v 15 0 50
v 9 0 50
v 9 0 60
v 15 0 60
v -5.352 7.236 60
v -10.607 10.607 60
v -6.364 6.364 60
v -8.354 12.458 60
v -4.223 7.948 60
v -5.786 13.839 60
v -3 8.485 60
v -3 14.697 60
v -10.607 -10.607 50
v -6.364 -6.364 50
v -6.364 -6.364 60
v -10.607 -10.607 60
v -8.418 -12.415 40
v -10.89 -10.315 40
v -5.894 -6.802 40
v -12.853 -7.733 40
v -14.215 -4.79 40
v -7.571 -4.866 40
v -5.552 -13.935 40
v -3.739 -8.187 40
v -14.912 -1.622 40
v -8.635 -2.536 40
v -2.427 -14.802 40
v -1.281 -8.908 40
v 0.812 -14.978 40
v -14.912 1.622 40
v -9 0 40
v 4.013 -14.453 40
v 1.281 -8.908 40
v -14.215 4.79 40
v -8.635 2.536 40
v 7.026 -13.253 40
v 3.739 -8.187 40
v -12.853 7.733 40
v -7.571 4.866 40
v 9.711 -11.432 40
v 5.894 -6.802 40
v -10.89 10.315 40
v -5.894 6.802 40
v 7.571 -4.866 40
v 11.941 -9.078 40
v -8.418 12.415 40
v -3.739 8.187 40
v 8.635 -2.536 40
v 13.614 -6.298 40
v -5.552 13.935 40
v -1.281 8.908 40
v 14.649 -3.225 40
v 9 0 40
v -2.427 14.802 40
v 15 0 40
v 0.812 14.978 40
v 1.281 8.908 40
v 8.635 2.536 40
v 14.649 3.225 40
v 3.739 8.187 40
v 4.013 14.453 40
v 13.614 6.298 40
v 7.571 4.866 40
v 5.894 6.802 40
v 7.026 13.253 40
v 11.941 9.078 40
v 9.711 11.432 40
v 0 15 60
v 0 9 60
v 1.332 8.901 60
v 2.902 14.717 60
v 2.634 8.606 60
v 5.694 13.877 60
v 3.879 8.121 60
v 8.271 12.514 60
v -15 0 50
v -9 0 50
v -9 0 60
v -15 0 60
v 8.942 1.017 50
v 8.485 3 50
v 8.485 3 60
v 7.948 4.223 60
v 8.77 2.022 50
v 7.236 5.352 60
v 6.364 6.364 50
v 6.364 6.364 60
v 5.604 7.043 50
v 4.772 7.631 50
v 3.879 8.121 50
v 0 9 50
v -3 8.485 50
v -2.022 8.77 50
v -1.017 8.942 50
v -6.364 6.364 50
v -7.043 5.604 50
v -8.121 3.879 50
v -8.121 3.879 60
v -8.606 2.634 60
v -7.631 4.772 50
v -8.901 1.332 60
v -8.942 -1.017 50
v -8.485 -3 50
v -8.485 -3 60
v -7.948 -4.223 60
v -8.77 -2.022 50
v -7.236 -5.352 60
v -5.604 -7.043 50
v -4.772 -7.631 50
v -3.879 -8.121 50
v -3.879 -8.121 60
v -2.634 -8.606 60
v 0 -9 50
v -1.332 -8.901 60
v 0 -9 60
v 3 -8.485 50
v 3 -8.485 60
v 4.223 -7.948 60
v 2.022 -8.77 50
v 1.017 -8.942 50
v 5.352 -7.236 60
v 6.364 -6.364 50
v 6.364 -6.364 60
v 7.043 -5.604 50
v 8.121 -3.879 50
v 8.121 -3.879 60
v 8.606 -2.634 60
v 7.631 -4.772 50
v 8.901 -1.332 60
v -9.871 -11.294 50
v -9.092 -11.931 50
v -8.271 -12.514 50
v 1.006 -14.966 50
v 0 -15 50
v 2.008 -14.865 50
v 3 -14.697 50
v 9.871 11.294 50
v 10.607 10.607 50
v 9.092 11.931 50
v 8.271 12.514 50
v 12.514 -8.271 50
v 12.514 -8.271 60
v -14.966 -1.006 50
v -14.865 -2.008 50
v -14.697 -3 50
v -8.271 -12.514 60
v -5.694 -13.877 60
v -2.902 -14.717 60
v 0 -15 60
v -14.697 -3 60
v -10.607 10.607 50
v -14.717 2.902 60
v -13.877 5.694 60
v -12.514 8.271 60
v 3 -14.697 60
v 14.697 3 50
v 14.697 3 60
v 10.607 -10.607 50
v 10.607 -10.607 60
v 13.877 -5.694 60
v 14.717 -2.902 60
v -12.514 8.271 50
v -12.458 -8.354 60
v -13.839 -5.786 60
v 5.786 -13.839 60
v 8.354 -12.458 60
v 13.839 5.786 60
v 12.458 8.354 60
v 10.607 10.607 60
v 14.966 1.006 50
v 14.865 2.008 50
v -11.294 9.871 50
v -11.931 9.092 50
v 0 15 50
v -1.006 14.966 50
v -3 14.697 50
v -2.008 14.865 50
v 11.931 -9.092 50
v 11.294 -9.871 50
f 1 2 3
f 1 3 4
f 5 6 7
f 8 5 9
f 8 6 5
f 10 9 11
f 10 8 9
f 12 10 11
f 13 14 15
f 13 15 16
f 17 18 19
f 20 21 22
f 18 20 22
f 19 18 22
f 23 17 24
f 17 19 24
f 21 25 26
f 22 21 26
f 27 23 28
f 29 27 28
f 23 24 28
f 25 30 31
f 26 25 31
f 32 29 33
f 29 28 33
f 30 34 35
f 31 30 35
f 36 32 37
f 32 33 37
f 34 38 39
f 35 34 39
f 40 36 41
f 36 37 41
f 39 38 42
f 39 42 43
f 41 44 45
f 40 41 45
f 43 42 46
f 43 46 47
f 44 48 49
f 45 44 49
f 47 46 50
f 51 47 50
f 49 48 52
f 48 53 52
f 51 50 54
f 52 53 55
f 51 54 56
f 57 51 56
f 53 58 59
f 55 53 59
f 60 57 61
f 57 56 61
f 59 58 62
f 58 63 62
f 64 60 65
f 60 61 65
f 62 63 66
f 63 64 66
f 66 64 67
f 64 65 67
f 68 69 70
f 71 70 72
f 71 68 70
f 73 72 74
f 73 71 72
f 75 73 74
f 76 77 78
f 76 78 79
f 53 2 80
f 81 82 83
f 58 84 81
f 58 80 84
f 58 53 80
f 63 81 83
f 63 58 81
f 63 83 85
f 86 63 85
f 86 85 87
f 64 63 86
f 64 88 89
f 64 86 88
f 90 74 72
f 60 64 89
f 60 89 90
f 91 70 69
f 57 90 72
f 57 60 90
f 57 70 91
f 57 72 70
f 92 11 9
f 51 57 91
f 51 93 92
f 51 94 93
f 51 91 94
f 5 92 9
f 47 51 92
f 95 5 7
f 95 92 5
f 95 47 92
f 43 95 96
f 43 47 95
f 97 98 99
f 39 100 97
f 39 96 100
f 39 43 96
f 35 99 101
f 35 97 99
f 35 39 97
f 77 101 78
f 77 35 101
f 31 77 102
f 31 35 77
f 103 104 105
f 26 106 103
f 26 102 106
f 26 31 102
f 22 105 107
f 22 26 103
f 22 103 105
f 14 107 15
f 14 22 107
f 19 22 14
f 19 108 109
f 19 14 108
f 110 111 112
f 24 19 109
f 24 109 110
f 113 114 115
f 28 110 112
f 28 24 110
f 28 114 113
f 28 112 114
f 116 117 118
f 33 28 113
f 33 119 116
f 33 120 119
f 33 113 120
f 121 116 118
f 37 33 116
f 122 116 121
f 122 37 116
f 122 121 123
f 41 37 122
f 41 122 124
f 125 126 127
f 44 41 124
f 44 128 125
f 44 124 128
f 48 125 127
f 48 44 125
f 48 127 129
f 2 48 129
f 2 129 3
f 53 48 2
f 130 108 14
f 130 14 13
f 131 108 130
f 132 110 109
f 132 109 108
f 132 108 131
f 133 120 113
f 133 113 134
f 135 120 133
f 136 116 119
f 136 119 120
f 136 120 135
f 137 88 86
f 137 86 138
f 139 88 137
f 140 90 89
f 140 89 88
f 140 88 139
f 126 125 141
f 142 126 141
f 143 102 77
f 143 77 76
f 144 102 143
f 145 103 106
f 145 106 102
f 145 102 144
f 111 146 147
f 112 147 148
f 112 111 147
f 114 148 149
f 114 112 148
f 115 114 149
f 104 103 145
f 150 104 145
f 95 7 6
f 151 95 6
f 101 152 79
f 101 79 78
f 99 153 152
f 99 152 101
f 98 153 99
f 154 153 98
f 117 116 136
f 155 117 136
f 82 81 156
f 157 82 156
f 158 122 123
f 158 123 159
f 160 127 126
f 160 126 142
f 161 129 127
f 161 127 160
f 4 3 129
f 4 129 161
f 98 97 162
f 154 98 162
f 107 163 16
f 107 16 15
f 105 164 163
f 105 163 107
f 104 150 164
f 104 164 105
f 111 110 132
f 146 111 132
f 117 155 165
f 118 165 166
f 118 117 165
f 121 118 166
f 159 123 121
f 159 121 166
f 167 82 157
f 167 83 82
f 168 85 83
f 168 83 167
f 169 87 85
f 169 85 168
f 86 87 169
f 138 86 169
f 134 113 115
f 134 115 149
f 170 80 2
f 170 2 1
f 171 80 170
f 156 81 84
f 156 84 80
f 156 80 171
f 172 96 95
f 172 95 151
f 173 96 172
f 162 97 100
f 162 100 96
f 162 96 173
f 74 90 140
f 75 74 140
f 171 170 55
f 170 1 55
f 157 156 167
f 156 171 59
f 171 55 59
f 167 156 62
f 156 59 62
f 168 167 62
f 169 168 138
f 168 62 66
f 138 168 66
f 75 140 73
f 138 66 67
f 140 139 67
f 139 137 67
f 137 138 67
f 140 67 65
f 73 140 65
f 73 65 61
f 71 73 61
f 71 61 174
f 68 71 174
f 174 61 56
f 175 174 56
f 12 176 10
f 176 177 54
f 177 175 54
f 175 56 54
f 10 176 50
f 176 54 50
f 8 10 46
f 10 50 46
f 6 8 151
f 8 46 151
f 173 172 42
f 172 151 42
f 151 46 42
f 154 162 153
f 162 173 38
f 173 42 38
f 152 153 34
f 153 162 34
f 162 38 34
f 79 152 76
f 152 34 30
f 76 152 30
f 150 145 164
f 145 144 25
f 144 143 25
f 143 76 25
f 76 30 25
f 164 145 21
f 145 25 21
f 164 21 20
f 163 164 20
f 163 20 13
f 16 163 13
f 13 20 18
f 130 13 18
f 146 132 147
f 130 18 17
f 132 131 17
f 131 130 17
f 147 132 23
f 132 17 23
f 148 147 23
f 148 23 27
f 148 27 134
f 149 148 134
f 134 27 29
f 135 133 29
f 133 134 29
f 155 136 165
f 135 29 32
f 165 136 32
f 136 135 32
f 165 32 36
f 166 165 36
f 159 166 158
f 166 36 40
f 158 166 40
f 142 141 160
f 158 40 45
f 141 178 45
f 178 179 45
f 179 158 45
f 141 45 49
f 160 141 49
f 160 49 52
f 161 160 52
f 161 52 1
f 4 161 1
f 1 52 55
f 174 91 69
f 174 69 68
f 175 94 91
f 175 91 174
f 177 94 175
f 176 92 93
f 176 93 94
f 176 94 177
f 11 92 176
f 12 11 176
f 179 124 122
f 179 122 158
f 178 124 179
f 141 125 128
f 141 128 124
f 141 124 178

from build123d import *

# Parameters (mm, degrees)
BOX002_W          = 20
BOX002_H          = 3
BOX002_DEPTH      = 100
ARRAY001_COUNT    = 8
CYLINDER005_R     = 9
CYLINDER005_DEPTH = 20
CYLINDER004_R     = 15
CYLINDER004_DEPTH = 20


with BuildPart() as almenas:
    # Box002 → Box002 (new body)
    with BuildSketch(Plane(origin=(7, 0, 50), x_dir=(1, 0, 0), z_dir=(0, 0, 1))):
        with Locations((10, 1.5)):
            Rectangle(BOX002_W, BOX002_H)
    extrude(amount=BOX002_DEPTH)

    # Array001: Almenas ×8 about axis
    array001_axis = Axis((0, 0, 0), (0, 0, 1))


with BuildPart() as almenas_1:
    add(almenas.part)
    for i in range(1, ARRAY001_COUNT):
        add(almenas.part.rotate(array001_axis, i * 360 / ARRAY001_COUNT))


with BuildPart() as cilindro003:
    # Cylinder005 → Cylinder005 (new body)
    with BuildSketch(Plane.XY.offset(40)):
        Circle(CYLINDER005_R)
    extrude(amount=CYLINDER005_DEPTH)


with BuildPart() as parte_superior:
    # Cylinder004 → Cylinder004 (new body)
    with BuildSketch(Plane.XY.offset(40)):
        Circle(CYLINDER004_R)
    extrude(amount=CYLINDER004_DEPTH)

    # Cut002: cut Cilindro003
    add(cilindro003.part, mode=Mode.SUBTRACT)

    # Cut003: cut Almenas
    add(almenas_1.part, mode=Mode.SUBTRACT)


solid = parte_superior.part
